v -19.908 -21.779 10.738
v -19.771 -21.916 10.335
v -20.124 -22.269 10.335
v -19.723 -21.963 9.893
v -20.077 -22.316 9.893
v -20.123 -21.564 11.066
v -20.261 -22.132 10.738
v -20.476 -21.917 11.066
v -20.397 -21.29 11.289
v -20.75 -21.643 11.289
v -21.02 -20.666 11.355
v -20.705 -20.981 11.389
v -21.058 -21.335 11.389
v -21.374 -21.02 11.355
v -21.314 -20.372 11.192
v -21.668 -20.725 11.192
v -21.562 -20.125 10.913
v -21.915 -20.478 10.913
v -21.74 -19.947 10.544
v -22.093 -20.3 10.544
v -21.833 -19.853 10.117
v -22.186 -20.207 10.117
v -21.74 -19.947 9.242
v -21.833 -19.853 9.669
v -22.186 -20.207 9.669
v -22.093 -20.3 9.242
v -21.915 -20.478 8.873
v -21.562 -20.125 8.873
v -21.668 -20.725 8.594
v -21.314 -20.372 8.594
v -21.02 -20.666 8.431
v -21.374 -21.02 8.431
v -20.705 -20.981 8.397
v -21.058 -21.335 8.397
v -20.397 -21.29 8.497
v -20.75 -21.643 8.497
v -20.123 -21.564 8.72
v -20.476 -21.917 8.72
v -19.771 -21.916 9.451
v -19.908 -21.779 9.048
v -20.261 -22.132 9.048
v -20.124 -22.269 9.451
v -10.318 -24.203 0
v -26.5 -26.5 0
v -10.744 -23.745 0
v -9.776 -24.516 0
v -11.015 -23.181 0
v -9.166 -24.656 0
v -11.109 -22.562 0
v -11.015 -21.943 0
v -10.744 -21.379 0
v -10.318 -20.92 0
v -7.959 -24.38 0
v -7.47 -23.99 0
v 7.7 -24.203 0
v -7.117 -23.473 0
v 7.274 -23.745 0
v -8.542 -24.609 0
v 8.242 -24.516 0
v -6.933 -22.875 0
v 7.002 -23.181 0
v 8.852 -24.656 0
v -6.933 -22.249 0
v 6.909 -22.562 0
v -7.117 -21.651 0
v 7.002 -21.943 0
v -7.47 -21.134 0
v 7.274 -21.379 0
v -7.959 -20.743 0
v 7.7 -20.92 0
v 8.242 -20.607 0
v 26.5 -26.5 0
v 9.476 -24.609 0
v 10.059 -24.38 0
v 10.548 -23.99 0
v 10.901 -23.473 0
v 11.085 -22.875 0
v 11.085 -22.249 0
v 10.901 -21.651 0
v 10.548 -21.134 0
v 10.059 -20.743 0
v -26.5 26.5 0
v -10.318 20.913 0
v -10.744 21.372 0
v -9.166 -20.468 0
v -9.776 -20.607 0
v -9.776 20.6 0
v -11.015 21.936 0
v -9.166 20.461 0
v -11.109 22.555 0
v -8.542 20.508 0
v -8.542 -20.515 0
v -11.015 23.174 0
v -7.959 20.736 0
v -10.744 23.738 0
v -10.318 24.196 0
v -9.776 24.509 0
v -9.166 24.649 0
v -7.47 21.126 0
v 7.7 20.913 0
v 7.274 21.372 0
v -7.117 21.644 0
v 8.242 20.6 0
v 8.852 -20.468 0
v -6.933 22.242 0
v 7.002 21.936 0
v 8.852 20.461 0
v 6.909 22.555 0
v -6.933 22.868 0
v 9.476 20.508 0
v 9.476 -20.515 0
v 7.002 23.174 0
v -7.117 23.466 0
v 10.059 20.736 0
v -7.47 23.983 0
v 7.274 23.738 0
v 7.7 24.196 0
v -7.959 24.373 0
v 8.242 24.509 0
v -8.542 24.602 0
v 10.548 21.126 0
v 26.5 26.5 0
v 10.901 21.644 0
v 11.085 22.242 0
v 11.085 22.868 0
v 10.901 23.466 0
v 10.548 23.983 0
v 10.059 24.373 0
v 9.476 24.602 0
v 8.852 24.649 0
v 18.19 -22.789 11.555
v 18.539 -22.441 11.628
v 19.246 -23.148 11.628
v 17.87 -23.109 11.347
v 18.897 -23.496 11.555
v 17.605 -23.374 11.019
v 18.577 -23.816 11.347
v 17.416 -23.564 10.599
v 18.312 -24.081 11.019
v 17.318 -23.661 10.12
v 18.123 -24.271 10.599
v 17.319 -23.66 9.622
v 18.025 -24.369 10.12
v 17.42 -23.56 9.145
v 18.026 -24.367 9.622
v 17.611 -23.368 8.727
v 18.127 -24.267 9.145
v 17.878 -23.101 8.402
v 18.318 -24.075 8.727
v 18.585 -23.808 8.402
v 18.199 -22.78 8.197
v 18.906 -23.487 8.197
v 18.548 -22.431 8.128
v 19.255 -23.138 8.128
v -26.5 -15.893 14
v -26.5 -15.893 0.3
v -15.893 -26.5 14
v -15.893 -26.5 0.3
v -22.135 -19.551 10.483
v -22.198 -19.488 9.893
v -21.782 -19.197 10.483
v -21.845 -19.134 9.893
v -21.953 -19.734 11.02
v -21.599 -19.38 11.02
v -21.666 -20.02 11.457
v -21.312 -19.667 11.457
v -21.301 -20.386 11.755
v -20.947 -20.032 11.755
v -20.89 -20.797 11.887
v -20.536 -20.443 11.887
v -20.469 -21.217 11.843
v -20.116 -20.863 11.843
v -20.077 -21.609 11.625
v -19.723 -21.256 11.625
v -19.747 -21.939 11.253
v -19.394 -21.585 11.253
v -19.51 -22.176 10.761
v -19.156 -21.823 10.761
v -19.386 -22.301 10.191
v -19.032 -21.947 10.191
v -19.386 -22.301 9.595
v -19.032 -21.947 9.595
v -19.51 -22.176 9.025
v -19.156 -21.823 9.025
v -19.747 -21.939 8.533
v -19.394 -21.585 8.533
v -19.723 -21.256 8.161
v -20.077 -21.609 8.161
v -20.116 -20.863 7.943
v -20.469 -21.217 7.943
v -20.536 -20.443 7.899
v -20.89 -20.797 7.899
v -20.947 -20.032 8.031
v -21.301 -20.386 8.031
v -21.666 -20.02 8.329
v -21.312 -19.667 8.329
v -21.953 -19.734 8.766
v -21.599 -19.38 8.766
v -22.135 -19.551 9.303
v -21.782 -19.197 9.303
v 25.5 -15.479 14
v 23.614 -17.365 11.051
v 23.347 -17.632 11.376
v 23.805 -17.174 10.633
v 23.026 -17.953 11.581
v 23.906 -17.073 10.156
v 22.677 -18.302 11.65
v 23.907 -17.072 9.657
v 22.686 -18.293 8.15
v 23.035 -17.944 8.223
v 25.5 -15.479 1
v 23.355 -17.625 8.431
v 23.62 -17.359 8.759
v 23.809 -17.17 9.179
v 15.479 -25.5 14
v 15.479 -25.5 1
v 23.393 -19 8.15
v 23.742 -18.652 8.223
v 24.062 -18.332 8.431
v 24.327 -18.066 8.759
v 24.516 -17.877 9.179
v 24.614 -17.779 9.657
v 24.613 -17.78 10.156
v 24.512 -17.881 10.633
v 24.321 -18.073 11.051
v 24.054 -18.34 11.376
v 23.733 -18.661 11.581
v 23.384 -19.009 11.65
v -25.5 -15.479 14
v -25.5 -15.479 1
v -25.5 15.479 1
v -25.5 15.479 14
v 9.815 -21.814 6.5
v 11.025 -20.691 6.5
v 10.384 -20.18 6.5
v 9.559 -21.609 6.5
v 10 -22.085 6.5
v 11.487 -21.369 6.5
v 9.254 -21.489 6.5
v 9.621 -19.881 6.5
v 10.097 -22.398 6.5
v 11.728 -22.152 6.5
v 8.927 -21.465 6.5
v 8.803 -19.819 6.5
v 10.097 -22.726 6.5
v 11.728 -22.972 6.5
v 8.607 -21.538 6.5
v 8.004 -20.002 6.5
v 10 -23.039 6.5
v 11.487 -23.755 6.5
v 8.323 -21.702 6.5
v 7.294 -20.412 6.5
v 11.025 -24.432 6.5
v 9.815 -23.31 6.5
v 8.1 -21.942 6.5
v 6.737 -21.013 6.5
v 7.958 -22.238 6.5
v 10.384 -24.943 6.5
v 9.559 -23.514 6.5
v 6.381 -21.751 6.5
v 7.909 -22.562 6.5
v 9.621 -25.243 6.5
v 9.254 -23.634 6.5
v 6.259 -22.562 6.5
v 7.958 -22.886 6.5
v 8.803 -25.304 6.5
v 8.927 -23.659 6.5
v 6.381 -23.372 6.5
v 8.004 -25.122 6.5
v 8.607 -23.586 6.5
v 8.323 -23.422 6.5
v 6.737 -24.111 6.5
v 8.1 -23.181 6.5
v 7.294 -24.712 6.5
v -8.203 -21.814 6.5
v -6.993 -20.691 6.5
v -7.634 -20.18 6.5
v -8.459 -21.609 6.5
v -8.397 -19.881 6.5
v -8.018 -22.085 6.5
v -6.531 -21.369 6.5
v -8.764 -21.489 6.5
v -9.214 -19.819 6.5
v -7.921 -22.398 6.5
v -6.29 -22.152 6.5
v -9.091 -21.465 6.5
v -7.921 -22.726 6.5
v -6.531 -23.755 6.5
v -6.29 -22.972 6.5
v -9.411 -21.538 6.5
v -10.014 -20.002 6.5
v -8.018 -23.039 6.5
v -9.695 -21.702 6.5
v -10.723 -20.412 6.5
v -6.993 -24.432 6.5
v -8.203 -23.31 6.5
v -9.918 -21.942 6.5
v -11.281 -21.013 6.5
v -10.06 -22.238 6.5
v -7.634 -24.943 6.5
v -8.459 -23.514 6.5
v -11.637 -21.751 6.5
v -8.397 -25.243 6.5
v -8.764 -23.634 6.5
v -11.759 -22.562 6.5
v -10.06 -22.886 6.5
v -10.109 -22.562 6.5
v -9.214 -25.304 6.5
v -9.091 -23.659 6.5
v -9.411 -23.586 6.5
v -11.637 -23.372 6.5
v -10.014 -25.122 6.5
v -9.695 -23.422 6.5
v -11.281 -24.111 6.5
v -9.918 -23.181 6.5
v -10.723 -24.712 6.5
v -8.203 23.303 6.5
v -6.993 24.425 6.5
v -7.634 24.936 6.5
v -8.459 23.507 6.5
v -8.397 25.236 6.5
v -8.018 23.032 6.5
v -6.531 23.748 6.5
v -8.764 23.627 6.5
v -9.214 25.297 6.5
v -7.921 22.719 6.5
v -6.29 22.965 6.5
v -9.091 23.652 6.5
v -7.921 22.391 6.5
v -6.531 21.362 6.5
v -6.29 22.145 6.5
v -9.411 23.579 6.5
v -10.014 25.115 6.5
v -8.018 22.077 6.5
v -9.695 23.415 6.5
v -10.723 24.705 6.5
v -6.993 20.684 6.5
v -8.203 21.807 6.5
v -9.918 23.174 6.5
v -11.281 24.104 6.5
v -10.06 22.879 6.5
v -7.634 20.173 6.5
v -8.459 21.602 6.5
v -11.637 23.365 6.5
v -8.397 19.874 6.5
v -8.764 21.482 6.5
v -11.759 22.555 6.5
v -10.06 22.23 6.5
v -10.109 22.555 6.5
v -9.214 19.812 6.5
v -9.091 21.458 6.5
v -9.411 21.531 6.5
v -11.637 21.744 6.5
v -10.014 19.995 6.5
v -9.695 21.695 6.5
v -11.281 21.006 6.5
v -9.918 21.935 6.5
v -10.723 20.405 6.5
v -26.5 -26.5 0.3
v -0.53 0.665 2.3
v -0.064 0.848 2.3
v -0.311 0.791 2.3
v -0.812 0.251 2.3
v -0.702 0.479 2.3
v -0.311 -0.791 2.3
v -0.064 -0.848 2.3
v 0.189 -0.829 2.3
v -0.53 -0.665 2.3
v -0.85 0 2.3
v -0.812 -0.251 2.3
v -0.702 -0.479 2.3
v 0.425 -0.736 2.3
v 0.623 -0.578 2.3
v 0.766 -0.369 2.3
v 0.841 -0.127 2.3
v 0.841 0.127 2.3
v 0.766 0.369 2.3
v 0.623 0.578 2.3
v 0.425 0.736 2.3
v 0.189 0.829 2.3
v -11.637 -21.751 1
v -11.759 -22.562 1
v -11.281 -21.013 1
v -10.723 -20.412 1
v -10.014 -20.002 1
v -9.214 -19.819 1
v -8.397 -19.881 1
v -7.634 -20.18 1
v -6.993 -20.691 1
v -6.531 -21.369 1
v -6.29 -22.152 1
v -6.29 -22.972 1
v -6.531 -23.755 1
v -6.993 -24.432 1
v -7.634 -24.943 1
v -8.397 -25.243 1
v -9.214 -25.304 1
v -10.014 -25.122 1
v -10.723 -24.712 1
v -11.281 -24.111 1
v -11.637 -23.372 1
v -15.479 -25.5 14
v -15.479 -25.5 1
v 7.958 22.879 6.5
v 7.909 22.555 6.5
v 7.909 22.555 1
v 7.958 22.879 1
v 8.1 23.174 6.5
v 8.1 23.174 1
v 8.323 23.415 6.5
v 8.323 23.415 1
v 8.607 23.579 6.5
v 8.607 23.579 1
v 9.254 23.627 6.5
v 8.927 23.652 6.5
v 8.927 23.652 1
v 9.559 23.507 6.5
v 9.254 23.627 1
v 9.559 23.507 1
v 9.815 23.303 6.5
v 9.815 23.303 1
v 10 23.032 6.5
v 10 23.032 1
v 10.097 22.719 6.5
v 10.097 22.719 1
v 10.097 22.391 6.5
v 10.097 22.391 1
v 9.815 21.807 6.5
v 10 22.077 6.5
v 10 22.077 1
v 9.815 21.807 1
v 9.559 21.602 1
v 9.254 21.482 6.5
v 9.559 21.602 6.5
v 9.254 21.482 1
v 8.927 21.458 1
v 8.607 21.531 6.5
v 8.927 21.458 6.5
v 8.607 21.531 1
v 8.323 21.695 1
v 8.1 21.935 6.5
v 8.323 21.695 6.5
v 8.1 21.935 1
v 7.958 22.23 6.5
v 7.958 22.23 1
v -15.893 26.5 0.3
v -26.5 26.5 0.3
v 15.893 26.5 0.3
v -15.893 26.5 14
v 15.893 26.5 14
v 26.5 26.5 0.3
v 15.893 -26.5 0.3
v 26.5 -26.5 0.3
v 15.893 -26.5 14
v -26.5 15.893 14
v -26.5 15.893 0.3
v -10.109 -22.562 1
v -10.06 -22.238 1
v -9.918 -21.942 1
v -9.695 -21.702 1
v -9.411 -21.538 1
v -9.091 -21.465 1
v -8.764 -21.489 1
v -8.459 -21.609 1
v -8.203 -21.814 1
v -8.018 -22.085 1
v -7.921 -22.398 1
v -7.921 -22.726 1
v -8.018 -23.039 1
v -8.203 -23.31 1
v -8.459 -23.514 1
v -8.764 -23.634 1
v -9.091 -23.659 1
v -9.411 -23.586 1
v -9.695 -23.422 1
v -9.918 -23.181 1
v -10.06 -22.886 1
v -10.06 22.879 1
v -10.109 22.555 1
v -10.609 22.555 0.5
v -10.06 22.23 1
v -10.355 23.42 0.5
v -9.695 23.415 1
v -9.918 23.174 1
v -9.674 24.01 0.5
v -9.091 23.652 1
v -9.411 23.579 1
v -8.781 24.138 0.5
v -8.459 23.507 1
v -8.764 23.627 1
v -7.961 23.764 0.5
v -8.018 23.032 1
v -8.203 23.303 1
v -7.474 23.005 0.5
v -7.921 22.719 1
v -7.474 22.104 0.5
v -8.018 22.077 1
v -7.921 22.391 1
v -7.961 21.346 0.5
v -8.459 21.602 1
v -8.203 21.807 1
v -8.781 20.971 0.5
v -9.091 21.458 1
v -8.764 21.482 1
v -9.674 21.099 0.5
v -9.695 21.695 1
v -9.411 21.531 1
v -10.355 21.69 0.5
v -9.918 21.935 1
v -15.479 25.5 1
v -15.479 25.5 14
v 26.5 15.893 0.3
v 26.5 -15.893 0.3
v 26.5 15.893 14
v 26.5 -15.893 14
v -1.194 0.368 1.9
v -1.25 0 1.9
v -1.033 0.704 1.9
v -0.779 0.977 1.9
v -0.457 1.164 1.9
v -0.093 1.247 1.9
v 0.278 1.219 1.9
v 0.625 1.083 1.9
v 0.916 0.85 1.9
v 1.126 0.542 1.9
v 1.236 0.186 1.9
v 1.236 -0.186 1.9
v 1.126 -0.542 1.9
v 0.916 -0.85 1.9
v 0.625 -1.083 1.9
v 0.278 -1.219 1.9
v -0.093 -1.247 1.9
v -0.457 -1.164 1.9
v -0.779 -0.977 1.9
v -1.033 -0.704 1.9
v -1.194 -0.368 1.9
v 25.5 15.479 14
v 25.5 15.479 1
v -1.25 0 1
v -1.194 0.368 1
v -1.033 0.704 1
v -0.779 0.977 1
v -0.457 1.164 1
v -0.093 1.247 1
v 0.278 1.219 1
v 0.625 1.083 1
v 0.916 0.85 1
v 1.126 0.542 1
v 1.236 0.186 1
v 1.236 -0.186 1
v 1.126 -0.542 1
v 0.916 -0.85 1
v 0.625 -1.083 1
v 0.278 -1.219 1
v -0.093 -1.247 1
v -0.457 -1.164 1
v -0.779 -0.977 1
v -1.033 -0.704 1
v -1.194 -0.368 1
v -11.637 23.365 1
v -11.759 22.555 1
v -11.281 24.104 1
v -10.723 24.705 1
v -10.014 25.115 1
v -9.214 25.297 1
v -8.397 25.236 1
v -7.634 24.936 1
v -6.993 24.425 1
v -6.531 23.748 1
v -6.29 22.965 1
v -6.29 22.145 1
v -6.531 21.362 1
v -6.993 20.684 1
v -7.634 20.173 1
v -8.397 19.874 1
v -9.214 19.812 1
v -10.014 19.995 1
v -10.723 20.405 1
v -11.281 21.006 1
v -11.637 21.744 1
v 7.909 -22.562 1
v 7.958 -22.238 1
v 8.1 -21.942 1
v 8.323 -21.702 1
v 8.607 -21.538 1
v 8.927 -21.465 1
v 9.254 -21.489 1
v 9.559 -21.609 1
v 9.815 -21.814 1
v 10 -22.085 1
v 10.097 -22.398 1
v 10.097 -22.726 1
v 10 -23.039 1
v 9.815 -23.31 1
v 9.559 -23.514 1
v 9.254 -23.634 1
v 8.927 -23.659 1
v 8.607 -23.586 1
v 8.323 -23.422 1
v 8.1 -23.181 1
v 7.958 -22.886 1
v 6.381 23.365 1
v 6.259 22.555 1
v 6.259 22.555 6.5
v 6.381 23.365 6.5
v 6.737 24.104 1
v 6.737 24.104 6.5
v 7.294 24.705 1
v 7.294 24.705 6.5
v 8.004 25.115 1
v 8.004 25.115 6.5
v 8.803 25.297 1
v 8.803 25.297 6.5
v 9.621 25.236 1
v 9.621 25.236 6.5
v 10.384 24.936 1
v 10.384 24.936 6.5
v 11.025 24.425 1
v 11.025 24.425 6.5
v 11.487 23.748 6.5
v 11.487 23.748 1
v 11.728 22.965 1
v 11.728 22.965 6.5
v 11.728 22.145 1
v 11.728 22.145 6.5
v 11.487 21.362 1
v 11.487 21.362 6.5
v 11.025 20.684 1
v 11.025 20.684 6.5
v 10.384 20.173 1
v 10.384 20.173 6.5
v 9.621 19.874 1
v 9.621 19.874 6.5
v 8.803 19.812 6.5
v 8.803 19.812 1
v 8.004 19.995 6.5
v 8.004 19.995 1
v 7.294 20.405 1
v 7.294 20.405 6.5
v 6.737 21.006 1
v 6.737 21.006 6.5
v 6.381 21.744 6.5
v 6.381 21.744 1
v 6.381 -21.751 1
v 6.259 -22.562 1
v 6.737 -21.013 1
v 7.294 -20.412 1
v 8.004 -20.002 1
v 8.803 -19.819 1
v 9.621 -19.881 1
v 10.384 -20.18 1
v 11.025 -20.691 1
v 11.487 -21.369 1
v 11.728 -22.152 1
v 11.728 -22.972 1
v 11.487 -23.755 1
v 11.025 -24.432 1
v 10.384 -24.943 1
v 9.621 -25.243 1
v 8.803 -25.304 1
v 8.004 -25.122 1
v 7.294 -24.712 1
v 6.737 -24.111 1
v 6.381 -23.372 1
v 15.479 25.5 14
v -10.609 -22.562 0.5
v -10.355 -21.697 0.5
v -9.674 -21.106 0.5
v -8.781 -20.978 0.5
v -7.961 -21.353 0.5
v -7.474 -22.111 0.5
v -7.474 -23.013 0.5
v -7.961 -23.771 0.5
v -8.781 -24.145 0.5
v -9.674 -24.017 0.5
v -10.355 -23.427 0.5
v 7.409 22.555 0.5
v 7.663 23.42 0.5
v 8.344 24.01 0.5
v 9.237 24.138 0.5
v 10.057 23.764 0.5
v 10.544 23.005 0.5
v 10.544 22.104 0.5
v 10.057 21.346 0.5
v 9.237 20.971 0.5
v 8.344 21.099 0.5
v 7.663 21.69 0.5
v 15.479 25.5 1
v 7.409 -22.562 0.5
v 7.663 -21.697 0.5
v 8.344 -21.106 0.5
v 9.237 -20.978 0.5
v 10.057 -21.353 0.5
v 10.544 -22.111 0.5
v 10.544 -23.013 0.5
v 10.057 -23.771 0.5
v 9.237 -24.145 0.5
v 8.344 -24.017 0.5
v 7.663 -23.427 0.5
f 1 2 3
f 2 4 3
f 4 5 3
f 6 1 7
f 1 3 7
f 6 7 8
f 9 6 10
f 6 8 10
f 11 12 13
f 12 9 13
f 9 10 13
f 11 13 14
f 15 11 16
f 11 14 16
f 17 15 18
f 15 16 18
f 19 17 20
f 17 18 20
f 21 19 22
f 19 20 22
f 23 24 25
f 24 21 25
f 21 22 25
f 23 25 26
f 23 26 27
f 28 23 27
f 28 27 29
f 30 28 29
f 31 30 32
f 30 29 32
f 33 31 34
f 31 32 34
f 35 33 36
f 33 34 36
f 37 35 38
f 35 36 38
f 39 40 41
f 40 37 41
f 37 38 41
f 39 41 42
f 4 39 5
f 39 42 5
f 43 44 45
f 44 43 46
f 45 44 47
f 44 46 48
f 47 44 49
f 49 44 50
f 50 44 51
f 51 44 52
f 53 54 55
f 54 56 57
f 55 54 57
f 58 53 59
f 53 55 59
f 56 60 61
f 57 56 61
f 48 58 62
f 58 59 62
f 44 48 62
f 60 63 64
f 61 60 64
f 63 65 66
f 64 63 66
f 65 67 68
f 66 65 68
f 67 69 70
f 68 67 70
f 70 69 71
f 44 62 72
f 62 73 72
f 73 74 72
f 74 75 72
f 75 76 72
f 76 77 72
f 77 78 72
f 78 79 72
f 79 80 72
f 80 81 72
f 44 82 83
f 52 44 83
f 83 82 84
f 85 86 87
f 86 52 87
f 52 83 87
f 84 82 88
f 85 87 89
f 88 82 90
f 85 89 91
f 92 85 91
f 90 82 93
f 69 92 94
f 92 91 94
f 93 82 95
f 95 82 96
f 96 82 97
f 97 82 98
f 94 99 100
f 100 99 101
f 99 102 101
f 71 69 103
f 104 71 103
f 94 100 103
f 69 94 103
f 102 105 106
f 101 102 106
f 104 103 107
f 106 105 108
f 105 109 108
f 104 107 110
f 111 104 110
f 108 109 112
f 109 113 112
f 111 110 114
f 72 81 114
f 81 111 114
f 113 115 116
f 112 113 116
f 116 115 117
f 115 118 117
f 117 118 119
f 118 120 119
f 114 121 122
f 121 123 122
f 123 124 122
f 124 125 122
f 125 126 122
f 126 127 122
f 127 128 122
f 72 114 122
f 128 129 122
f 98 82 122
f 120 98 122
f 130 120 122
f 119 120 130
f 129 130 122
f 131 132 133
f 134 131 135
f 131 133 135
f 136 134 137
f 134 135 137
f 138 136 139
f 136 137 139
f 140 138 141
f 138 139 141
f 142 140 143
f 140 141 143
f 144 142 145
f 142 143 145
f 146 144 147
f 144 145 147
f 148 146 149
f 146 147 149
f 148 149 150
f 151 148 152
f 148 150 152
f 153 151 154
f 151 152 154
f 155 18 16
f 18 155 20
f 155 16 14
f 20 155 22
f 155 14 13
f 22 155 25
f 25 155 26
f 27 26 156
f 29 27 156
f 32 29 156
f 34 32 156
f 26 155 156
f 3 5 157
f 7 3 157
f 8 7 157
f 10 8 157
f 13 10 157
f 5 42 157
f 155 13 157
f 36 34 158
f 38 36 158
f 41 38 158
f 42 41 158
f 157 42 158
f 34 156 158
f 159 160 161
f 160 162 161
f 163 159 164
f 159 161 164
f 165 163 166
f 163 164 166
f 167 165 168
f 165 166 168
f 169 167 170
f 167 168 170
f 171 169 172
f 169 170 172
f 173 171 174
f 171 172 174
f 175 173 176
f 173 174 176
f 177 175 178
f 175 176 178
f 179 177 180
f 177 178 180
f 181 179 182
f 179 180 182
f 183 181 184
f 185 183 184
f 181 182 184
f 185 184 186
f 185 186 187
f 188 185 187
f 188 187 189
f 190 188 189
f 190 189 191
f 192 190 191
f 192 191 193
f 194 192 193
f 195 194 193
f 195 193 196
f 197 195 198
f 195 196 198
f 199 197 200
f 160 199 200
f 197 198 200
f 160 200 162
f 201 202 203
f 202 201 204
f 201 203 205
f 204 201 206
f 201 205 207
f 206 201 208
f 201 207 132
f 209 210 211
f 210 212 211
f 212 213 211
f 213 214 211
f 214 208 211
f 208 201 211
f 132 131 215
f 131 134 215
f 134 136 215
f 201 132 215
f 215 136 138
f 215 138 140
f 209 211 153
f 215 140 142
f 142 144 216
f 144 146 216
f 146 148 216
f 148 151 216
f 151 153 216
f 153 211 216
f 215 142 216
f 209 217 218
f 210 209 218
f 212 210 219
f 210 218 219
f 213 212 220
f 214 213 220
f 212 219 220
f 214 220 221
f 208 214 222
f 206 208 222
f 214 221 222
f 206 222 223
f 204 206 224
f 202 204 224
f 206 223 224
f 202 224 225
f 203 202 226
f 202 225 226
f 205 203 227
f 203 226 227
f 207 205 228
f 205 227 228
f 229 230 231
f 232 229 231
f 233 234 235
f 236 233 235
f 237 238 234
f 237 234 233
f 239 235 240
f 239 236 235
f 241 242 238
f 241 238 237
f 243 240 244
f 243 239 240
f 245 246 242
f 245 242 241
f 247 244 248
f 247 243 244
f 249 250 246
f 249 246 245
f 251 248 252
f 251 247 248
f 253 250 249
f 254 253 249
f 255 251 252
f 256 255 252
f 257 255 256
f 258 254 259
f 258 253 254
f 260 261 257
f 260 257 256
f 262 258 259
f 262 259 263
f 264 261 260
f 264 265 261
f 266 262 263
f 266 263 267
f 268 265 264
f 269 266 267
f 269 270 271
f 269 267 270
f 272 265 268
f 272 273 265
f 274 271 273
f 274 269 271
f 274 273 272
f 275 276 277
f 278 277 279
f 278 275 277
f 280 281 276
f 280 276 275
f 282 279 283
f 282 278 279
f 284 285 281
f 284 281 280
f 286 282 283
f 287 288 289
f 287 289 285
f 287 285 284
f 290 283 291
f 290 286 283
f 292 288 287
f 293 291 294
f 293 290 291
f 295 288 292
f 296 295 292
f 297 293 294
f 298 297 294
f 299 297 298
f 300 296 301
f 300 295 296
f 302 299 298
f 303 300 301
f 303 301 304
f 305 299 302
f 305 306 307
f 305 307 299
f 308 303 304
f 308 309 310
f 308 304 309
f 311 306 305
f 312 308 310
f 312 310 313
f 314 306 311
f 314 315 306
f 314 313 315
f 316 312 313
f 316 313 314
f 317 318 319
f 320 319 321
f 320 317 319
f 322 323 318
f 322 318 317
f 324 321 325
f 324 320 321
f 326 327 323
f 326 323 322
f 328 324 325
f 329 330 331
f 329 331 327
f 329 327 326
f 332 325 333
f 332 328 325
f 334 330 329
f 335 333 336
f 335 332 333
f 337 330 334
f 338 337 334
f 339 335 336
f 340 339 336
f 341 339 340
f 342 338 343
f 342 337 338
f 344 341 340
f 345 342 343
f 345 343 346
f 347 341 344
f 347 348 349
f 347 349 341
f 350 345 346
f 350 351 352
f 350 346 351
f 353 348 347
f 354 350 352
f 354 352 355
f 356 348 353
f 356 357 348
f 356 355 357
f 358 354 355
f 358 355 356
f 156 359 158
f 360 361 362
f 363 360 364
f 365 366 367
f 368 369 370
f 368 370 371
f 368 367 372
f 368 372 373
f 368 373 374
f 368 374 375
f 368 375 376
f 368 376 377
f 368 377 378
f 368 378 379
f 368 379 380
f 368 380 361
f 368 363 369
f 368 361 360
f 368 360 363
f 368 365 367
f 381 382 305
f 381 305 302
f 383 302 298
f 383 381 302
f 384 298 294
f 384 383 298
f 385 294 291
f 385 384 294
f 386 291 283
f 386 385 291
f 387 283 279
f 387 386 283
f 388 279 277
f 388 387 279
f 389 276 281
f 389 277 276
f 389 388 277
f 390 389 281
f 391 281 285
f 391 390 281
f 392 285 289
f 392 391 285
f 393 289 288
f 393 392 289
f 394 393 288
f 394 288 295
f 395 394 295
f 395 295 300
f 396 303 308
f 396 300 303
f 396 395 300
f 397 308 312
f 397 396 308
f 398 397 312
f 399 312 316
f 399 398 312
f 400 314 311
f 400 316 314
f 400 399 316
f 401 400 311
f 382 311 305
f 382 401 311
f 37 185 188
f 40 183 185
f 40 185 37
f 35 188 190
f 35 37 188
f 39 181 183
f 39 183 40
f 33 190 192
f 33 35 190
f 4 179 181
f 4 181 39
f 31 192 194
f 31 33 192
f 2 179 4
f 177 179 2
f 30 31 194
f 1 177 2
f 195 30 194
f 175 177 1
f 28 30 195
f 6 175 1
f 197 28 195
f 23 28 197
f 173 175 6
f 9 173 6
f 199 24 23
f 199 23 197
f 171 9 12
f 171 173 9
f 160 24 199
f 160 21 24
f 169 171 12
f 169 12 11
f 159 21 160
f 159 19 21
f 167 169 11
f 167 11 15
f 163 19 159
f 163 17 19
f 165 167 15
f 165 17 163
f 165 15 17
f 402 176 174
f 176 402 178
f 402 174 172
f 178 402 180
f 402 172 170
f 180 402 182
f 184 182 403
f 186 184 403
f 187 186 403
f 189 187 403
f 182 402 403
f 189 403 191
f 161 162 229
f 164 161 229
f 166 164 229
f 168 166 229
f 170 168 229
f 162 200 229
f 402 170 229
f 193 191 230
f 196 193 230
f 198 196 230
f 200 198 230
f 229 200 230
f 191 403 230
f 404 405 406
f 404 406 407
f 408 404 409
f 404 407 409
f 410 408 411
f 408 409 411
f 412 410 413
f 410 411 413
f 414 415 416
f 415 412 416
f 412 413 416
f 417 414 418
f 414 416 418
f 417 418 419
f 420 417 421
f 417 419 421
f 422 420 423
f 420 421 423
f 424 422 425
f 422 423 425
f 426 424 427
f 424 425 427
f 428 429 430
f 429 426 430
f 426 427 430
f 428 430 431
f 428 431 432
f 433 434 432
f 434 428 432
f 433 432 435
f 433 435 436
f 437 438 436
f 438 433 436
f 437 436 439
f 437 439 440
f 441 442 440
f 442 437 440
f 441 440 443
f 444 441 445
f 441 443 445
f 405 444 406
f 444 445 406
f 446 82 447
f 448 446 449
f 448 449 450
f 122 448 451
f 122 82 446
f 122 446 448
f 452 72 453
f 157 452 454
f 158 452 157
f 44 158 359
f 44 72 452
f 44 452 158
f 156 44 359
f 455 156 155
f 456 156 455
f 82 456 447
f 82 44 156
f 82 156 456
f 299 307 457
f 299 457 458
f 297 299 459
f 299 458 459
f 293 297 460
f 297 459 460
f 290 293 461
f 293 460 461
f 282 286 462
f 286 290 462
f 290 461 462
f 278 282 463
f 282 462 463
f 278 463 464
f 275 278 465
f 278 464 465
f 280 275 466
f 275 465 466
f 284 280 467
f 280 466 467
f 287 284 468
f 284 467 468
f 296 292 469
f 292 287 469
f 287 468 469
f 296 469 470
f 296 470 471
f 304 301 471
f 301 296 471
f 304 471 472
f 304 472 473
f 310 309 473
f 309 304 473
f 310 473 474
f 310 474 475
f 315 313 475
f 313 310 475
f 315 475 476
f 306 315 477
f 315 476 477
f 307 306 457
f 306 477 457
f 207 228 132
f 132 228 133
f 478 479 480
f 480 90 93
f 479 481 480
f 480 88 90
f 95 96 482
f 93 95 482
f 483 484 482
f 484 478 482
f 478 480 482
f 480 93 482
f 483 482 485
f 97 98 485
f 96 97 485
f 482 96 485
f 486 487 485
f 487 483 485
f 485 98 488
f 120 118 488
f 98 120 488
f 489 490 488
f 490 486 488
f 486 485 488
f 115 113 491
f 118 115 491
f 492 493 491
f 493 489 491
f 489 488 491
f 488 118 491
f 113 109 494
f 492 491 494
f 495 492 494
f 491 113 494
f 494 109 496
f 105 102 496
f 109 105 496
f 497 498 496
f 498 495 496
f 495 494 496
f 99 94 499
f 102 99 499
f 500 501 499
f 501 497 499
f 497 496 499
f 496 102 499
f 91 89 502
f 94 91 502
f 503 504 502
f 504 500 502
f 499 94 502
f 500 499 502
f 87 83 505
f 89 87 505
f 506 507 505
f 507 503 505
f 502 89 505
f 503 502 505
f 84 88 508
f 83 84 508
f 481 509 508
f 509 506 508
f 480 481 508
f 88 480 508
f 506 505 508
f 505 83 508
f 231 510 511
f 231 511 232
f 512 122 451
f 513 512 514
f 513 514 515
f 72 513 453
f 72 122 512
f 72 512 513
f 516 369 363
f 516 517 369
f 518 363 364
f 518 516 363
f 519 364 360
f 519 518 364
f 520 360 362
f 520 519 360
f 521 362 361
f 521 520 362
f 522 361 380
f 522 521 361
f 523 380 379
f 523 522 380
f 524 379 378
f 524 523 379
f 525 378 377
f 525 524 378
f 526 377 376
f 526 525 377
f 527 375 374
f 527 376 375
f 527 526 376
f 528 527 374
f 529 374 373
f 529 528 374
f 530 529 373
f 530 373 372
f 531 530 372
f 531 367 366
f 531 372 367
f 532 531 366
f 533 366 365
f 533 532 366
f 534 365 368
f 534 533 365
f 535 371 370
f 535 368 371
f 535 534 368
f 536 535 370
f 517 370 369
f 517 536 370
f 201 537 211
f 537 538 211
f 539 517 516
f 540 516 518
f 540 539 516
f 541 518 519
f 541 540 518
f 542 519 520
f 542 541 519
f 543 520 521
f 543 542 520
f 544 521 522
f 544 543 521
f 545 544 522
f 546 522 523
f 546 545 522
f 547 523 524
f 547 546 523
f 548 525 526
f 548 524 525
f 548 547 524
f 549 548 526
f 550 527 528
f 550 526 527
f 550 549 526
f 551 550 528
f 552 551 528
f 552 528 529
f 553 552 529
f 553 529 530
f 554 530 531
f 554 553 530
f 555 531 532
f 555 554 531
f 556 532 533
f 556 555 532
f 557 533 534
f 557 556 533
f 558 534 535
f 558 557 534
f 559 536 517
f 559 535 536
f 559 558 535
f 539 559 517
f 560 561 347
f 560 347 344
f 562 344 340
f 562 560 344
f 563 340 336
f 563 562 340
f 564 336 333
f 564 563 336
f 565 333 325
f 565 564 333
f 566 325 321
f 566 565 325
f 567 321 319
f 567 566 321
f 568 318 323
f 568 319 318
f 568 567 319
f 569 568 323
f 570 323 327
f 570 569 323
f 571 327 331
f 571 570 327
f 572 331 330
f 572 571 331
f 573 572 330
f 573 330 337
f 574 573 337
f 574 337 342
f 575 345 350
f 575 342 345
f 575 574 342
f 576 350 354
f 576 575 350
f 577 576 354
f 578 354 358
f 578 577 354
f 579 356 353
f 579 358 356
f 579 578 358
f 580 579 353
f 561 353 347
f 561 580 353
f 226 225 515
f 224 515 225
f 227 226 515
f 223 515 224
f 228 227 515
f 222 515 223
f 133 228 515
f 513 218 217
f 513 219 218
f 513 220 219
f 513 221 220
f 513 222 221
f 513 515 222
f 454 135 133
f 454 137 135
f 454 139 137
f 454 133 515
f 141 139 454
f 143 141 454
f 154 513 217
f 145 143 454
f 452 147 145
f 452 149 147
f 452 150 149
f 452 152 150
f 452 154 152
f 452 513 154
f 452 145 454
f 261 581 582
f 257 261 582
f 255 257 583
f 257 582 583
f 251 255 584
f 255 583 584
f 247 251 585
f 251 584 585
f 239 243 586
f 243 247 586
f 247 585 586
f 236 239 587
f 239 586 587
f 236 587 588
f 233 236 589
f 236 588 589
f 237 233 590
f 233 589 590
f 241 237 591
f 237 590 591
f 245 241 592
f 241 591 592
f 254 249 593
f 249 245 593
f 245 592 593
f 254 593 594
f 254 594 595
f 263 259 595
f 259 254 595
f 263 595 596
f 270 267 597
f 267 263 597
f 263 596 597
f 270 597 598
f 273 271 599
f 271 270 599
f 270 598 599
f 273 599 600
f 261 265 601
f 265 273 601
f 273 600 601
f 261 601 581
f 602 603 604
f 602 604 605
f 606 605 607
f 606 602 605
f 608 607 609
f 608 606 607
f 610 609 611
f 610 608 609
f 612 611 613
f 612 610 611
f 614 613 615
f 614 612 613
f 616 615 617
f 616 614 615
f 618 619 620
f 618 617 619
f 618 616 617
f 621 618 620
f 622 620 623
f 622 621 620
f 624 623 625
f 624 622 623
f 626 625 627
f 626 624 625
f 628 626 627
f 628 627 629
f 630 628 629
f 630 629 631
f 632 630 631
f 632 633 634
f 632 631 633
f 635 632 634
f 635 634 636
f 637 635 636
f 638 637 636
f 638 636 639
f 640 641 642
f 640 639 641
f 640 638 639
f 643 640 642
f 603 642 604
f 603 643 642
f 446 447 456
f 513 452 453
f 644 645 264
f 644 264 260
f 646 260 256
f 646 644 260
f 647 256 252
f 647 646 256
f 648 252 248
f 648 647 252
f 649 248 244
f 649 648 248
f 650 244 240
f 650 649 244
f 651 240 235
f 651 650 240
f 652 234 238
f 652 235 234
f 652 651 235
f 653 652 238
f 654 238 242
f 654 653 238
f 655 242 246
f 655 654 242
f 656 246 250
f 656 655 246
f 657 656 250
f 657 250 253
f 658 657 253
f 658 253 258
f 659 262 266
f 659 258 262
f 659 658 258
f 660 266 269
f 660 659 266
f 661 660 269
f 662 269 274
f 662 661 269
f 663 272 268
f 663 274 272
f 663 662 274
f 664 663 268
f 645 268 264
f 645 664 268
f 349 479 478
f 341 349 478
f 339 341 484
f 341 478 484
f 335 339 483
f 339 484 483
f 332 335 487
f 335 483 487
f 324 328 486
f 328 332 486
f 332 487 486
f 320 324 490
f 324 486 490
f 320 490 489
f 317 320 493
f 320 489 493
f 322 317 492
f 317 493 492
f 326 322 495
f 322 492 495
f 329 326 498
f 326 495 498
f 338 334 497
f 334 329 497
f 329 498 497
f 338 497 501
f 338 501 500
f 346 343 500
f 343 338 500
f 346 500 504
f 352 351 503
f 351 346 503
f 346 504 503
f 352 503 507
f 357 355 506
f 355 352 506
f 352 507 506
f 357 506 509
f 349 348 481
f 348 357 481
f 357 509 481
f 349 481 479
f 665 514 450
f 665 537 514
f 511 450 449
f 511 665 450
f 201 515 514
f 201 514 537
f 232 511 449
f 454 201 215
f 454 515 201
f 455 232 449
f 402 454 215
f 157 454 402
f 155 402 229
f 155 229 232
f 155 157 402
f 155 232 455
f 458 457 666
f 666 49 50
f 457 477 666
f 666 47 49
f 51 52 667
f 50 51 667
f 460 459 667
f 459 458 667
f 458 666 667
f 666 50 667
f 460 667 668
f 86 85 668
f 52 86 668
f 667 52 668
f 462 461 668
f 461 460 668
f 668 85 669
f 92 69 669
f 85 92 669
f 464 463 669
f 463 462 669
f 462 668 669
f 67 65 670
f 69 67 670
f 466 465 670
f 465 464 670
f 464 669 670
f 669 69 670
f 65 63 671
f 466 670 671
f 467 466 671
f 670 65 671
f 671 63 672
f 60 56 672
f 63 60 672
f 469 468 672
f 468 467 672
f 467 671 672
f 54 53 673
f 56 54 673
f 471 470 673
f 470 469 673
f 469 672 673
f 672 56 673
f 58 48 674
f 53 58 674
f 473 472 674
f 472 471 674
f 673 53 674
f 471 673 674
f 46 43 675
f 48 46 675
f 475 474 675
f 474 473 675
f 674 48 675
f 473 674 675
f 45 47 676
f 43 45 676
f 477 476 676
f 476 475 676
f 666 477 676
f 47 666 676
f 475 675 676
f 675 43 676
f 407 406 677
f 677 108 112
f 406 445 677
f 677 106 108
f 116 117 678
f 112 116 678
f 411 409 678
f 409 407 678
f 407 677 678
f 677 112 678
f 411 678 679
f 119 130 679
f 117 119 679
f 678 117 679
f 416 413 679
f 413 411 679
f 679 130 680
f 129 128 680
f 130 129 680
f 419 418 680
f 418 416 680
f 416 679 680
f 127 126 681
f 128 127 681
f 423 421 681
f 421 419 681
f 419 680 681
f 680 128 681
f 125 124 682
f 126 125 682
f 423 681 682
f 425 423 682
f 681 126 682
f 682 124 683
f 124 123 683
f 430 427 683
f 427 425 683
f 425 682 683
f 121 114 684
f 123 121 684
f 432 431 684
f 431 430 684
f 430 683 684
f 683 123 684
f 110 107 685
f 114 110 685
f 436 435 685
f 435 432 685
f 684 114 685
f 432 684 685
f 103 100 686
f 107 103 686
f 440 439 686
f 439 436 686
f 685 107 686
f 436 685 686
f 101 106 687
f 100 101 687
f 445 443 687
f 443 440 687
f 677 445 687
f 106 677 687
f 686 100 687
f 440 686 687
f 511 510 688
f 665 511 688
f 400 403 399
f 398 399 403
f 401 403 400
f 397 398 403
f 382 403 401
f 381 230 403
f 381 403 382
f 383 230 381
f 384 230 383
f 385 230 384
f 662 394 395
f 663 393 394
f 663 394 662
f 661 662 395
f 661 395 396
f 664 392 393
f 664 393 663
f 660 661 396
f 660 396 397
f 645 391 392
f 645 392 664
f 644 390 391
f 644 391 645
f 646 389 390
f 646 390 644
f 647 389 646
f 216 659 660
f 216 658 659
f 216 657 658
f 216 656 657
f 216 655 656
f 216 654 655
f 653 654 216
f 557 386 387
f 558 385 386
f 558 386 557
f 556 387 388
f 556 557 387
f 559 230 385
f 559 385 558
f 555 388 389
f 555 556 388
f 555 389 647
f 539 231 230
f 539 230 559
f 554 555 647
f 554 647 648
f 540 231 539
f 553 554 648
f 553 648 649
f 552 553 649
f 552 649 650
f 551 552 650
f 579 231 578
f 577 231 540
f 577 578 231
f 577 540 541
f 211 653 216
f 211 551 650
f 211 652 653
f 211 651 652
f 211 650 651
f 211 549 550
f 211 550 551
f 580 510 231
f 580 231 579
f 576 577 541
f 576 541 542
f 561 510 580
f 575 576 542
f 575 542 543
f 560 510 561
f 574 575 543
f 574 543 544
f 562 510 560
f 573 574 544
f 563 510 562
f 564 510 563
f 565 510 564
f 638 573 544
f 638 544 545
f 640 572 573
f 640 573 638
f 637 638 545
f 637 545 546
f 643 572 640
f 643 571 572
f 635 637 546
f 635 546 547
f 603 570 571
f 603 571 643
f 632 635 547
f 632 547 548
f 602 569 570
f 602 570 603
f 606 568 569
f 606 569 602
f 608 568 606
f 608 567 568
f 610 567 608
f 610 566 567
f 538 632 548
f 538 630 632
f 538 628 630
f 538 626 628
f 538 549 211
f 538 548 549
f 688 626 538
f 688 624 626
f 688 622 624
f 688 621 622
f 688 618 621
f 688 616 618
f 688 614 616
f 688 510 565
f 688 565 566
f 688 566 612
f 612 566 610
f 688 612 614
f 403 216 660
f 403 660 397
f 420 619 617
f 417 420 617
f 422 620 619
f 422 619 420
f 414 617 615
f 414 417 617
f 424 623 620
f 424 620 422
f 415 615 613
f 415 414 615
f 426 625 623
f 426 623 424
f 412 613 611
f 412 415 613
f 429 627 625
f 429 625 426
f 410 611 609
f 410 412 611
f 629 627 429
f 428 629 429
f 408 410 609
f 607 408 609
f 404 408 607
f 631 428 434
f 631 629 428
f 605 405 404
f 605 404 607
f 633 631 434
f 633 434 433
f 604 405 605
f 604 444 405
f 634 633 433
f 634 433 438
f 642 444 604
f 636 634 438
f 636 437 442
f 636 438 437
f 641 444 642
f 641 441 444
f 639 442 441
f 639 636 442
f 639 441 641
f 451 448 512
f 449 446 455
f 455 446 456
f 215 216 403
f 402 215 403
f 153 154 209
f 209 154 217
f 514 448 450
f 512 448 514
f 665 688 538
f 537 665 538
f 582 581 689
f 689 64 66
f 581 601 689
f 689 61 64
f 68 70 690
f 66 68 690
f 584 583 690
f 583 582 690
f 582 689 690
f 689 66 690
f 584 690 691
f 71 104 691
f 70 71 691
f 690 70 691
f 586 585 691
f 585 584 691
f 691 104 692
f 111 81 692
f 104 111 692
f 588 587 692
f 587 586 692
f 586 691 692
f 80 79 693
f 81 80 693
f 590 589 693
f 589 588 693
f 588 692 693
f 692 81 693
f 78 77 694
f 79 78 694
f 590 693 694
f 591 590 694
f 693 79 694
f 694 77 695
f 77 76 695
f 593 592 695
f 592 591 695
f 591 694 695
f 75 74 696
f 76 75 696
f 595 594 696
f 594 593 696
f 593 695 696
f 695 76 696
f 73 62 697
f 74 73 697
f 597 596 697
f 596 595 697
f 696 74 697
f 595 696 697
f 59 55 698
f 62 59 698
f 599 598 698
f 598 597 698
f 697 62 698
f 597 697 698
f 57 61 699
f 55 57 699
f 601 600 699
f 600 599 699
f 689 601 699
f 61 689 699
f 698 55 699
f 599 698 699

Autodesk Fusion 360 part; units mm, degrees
sketch "Sketch1" plane through (0, 0, 0) normal (0, 0, 1) x (1, 0, 0)
  circle A0 centre (0, 0) radius 1.75
  dimension "d1" = 3.5
extrude "Extrude1" add sketch "Sketch1" along normal blind 0.3
sketch "Sketch2" plane through (0, 0, 0.3) normal (0, 0, 1) x (-1, 0, 0)
  circle A0 centre (0, 0) radius 1.75
  circle A1 centre (0, 0) radius 1.25
  dimension "d4" = 2.5
extrude "Extrude2" add sketch "Sketch2" along normal blind 2 contours A1
chamfer "Chamfer1" distance 0.4 angle 45 1 edges at (1.1654, 0.452, 2.3)

Autodesk Fusion 360 part; units mm, degrees
sketch "Sketch1" plane through (0, 0, 0) normal (0, 0, 1) x (1, 0, 0)
  line L0 (-26.5, 26.5) -> (26.5, 26.5)
  line L1 (26.5, 26.5) -> (26.5, -26.5)
  line L2 (26.5, -26.5) -> (-26.5, -26.5)
  line L3 (-26.5, -26.5) -> (-26.5, 26.5)
  line L4 (-26.5, 26.5) -> (26.5, -26.5) construction
  line L5 (26.5, 26.5) -> (-26.5, -26.5) construction
  line L6 (-15.8934, 26.5) -> (-26.5, 15.8934)
  line L7 (15.8934, 26.5) -> (26.5, 15.8934)
  line L8 (26.5, -15.8934) -> (15.8934, -26.5)
  line L9 (-26.5, -15.8934) -> (-15.8934, -26.5)
  dimension "d34" = 53
  dimension "d35" = 53
  dimension "d36" = 15
  dimension "d37" = 15
  dimension "d38" = 15
  dimension "d39" = 15
extrude "Extrude1" add sketch "Sketch1" along normal blind 1 contours L0 L1 L2 L3 L6 L7 L8 L9
sketch "Sketch3" plane through (0, 0, 1) normal (0, 0, 1) x (-1, 0, 0)
  line L0 (15.8934, -26.5) -> (26.5, -15.8934)
  line L1 (26.5, -15.8934) -> (26.5, 15.8934)
  line L2 (26.5, 15.8934) -> (15.8934, 26.5)
  line L3 (15.8934, 26.5) -> (-15.8934, 26.5)
  line L4 (-15.8934, 26.5) -> (-26.5, 15.8934)
  line L5 (-26.5, 15.8934) -> (-26.5, -15.8934)
  line L6 (-26.5, -15.8934) -> (-15.8934, -26.5)
  line L7 (-15.8934, -26.5) -> (15.8934, -26.5)
  line L8 (25.5, -25.5) -> (-25.5, -25.5)
  line L9 (-25.5, -25.5) -> (-25.5, 25.5)
  line L10 (-25.5, 25.5) -> (25.5, 25.5)
  line L11 (25.5, 25.5) -> (25.5, -25.5)
  line L12 (25.5, -25.5) -> (-25.5, 25.5) construction
  line L13 (-25.5, -25.5) -> (25.5, 25.5) construction
  line L14 (15.4792, -25.5) -> (25.5, -15.4792)
  line L15 (-15.4792, -25.5) -> (-25.5, -15.4792)
  line L16 (-25.5, 15.4792) -> (-15.4792, 25.5)
  line L17 (15.4792, 25.5) -> (25.5, 15.4792)
  dimension "d42" = 1
  dimension "d43" = 1
  dimension "d44" = 1
  dimension "d45" = 1
  dimension "d46" = 1
extrude "Extrude3" add sketch "Sketch3" along normal blind 13 contours L0 L6 L7 L8 | L0 L8 L11 L14 | L0 L1 L2 L11 | L6 L8 L9 L15 | L4 L5 L6 L9 | L2 L10 L11 L17 | L2 L3 L4 L10 | L4 L9 L10 L16
sketch "Sketch5" plane through (21.1967, -21.1967, 0) normal (0.7071, -0.7071, 0) x (0.7071, 0.7071, 0)
  line L0 (-7.5, 0) -> (7.5, 0)
  line L1 (7.5, 0) -> (7.5, 14)
  line L2 (7.5, 14) -> (-7.5, 14)
  line L3 (-7.5, 14) -> (-7.5, 0)
  line L4 (-2.746, 8.1279) -> (3.1066, 8.15)
  arc A0 (3.1066, 8.15) -> (3.0934, 11.65) centre (3.1, 9.9) ccw
  line L5 (3.0934, 11.65) -> (-2.7592, 11.6279)
  arc A1 (-2.7592, 11.6279) -> (-2.746, 8.1279) centre (-2.7526, 9.8779) ccw
  line L6 (-2.7526, 9.8779) -> (3.1, 9.9) construction
  dimension "d93" = 4.1221
  dimension "d94" = 4.7474
  dimension "d95" = 1.75
  dimension "d96" = 5.8526
extrude "Extrude5" cut sketch "Sketch5" against normal blind 2 contours L4 A0 L5 A1
sketch "Sketch7" plane through (0, 26.5, 0) normal (0, 1, 0) x (-1, 0, 0)
  line L0 (-15.8934, 0) -> (15.8934, 0)
  line L1 (15.8934, 0) -> (15.8934, 14)
  line L2 (15.8934, 14) -> (-15.8934, 14)
  line L3 (-15.8934, 14) -> (-15.8934, 0)
  line L4 (-2.0165, 11.171) -> (2.0293, 11.171)
  line L5 (2.0293, 11.171) -> (2.0293, 8.1421)
  line L6 (2.0293, 8.1421) -> (-2.0165, 8.1421)
  line L7 (-2.0165, 8.1421) -> (-2.0165, 11.171)
  dimension "d82" = 2.829
  dimension "d83" = 4.0458
  dimension "d84" = 3.0289
  dimension "d85" = 13.8769
extrude "Extrude7" cut sketch "Sketch7" along normal through all contours L4 L5 L6 L7
sketch "Sketch8" plane through (-26.5, 0, 0) normal (-1, 0, 0) x (0, -1, 0)
  line L0 (-15.8934, 0) -> (15.8934, 0)
  line L1 (15.8934, 0) -> (15.8934, 14)
  line L2 (15.8934, 14) -> (-15.8934, 14)
  line L3 (-15.8934, 14) -> (-15.8934, 0)
  line L4 (-2.0152, 11.1757) -> (2.0191, 11.1757)
  line L5 (2.0191, 11.1757) -> (2.0191, 8.2313)
  line L6 (2.0191, 8.2313) -> (-2.0152, 8.2313)
  line L7 (-2.0152, 8.2313) -> (-2.0152, 11.1757)
  dimension "d87" = 2.8243
  dimension "d88" = 2.9444
  dimension "d89" = 4.0342
  dimension "d90" = 13.8782
extrude "Extrude8" cut sketch "Sketch8" along normal through all contours L4 L5 L6 L7
sketch "Sketch9" plane through (0, 0, 1) normal (0, 0, 1) x (-1, 0, 0)
  line L0 (25.5, -15.4792) -> (25.5, 15.4792)
  line L1 (25.5, 15.4792) -> (15.4792, 25.5)
  line L2 (15.4792, 25.5) -> (-15.4792, 25.5)
  line L3 (-15.4792, 25.5) -> (-25.5, 15.4792)
  line L4 (-25.5, 15.4792) -> (-25.5, -15.4792)
  line L5 (-25.5, -15.4792) -> (-15.4792, -25.5)
  line L6 (-15.4792, -25.5) -> (15.4792, -25.5)
  line L7 (15.4792, -25.5) -> (25.5, -15.4792)
  circle A0 centre (-9.009, 22.5618) radius 1.1
  circle A1 centre (9.0089, 22.5618) radius 1.1
  circle A2 centre (-9.009, -22.5547) radius 1.1
  circle A3 centre (9.0089, -22.5547) radius 1.1
  dimension "d62" = 2.2
  dimension "d63" = 2.2
  dimension "d64" = 2.2
  dimension "d65" = 2.2
extrude "Extrude9" cut sketch "Sketch9" against normal blind 10 contours A0 | A1 | A2 | A3
chamfer "Chamfer1" distance 1 angle 45 4 edges at (-7.9834, 22.9525, 0) (10.0345, 22.9525, 0) (10.0345, -22.164, 0) (-7.9834, -22.164, 0)
sketch "Sketch11" plane through (-21.1967, -21.1967, 0) normal (-0.7071, -0.7071, 0) x (0.7071, -0.7071, 0)
  line L0 (-7.5, 0) -> (7.5, 0)
  line L1 (7.5, 0) -> (7.5, 14)
  line L2 (7.5, 14) -> (-7.5, 14)
  line L3 (-7.5, 14) -> (-7.5, 0)
  circle A0 centre (0.0835, 9.893) radius 1.5
  dimension "d73" = 3
  dimension "d91" = 4.107
  dimension "d92" = 7.5835
extrude "Extrude11" cut sketch "Sketch11" against normal blind 5 contours A0
sketch "Sketch12" plane through (-20.4896, -20.4896, 0) normal (0.7071, 0.7071, 0) x (-0.7071, 0.7071, 0)
  circle A0 centre (-0.0835, 9.893) radius 1.5
  line L0 (-7.0858, 1) -> (7.0858, 1)
  line L1 (7.0858, 1) -> (7.0858, 14)
  line L2 (7.0858, 14) -> (-7.0858, 14)
  line L3 (-7.0858, 14) -> (-7.0858, 1)
  circle A1 centre (-0.0835, 9.893) radius 1.5
  circle A2 centre (-0.0835, 9.893) radius 2
  dimension "d77" = 4
extrude "Extrude12" cut sketch "Sketch12" against normal blind 0.5 contours A2
sketch "Sketch13" plane through (0, 0, 0) normal (0, 0, -1) x (1, 0, 0)
  circle A0 centre (9.009, 22.5618) radius 2.1
  circle A1 centre (-9.0089, -22.5547) radius 2.1
  line L0 (-26.5, -15.8934) -> (-15.8934, -26.5)
  line L1 (-15.8934, -26.5) -> (15.8934, -26.5)
  line L2 (15.8934, -26.5) -> (26.5, -15.8934)
  line L3 (26.5, -15.8934) -> (26.5, 15.8934)
  line L4 (26.5, 15.8934) -> (15.8934, 26.5)
  line L5 (15.8934, 26.5) -> (-15.8934, 26.5)
  line L6 (-15.8934, 26.5) -> (-26.5, 15.8934)
  line L7 (-26.5, 15.8934) -> (-26.5, -15.8934)
  circle A2 centre (9.009, -22.5547) radius 2.1
  circle A3 centre (-9.0089, 22.5618) radius 2.1
sketch "Sketch14" plane through (0, 0, 1) normal (0, 0, 1) x (-1, 0, 0)
  line L0 (25.5, -15.4792) -> (25.5, 15.4792)
  line L1 (25.5, 15.4792) -> (15.4792, 25.5)
  line L2 (15.4792, 25.5) -> (-15.4792, 25.5)
  line L3 (-15.4792, 25.5) -> (-25.5, 15.4792)
  line L4 (-25.5, 15.4792) -> (-25.5, -15.4792)
  line L5 (-25.5, -15.4792) -> (-15.4792, -25.5)
  line L6 (-15.4792, -25.5) -> (15.4792, -25.5)
  line L7 (15.4792, -25.5) -> (25.5, -15.4792)
  circle A0 centre (9.0089, -22.5547) radius 1.1
  circle A1 centre (9.0089, -22.5547) radius 2.75
  circle A2 centre (-9.009, -22.5547) radius 1.1
  circle A3 centre (-9.009, -22.5547) radius 2.75
  circle A4 centre (9.0089, 22.5618) radius 1.1
  circle A5 centre (9.0089, 22.5618) radius 2.75
  circle A6 centre (-9.009, 22.5618) radius 1.1
  circle A7 centre (-9.009, 22.5618) radius 2.75
  circle A8 centre (9.0089, 22.5618) radius 1.1
  circle A9 centre (9.0089, -22.5547) radius 1.1
  circle A10 centre (-9.009, 22.5618) radius 1.1
  circle A11 centre (-9.009, -22.5547) radius 1.1
  dimension "d97" = 5.5
  dimension "d98" = 5.5
  dimension "d99" = 5.5
  dimension "d100" = 5.5
extrude "Extrude13" add sketch "Sketch14" along normal blind 5.5 contours A1 | A3 | A5 | A7
